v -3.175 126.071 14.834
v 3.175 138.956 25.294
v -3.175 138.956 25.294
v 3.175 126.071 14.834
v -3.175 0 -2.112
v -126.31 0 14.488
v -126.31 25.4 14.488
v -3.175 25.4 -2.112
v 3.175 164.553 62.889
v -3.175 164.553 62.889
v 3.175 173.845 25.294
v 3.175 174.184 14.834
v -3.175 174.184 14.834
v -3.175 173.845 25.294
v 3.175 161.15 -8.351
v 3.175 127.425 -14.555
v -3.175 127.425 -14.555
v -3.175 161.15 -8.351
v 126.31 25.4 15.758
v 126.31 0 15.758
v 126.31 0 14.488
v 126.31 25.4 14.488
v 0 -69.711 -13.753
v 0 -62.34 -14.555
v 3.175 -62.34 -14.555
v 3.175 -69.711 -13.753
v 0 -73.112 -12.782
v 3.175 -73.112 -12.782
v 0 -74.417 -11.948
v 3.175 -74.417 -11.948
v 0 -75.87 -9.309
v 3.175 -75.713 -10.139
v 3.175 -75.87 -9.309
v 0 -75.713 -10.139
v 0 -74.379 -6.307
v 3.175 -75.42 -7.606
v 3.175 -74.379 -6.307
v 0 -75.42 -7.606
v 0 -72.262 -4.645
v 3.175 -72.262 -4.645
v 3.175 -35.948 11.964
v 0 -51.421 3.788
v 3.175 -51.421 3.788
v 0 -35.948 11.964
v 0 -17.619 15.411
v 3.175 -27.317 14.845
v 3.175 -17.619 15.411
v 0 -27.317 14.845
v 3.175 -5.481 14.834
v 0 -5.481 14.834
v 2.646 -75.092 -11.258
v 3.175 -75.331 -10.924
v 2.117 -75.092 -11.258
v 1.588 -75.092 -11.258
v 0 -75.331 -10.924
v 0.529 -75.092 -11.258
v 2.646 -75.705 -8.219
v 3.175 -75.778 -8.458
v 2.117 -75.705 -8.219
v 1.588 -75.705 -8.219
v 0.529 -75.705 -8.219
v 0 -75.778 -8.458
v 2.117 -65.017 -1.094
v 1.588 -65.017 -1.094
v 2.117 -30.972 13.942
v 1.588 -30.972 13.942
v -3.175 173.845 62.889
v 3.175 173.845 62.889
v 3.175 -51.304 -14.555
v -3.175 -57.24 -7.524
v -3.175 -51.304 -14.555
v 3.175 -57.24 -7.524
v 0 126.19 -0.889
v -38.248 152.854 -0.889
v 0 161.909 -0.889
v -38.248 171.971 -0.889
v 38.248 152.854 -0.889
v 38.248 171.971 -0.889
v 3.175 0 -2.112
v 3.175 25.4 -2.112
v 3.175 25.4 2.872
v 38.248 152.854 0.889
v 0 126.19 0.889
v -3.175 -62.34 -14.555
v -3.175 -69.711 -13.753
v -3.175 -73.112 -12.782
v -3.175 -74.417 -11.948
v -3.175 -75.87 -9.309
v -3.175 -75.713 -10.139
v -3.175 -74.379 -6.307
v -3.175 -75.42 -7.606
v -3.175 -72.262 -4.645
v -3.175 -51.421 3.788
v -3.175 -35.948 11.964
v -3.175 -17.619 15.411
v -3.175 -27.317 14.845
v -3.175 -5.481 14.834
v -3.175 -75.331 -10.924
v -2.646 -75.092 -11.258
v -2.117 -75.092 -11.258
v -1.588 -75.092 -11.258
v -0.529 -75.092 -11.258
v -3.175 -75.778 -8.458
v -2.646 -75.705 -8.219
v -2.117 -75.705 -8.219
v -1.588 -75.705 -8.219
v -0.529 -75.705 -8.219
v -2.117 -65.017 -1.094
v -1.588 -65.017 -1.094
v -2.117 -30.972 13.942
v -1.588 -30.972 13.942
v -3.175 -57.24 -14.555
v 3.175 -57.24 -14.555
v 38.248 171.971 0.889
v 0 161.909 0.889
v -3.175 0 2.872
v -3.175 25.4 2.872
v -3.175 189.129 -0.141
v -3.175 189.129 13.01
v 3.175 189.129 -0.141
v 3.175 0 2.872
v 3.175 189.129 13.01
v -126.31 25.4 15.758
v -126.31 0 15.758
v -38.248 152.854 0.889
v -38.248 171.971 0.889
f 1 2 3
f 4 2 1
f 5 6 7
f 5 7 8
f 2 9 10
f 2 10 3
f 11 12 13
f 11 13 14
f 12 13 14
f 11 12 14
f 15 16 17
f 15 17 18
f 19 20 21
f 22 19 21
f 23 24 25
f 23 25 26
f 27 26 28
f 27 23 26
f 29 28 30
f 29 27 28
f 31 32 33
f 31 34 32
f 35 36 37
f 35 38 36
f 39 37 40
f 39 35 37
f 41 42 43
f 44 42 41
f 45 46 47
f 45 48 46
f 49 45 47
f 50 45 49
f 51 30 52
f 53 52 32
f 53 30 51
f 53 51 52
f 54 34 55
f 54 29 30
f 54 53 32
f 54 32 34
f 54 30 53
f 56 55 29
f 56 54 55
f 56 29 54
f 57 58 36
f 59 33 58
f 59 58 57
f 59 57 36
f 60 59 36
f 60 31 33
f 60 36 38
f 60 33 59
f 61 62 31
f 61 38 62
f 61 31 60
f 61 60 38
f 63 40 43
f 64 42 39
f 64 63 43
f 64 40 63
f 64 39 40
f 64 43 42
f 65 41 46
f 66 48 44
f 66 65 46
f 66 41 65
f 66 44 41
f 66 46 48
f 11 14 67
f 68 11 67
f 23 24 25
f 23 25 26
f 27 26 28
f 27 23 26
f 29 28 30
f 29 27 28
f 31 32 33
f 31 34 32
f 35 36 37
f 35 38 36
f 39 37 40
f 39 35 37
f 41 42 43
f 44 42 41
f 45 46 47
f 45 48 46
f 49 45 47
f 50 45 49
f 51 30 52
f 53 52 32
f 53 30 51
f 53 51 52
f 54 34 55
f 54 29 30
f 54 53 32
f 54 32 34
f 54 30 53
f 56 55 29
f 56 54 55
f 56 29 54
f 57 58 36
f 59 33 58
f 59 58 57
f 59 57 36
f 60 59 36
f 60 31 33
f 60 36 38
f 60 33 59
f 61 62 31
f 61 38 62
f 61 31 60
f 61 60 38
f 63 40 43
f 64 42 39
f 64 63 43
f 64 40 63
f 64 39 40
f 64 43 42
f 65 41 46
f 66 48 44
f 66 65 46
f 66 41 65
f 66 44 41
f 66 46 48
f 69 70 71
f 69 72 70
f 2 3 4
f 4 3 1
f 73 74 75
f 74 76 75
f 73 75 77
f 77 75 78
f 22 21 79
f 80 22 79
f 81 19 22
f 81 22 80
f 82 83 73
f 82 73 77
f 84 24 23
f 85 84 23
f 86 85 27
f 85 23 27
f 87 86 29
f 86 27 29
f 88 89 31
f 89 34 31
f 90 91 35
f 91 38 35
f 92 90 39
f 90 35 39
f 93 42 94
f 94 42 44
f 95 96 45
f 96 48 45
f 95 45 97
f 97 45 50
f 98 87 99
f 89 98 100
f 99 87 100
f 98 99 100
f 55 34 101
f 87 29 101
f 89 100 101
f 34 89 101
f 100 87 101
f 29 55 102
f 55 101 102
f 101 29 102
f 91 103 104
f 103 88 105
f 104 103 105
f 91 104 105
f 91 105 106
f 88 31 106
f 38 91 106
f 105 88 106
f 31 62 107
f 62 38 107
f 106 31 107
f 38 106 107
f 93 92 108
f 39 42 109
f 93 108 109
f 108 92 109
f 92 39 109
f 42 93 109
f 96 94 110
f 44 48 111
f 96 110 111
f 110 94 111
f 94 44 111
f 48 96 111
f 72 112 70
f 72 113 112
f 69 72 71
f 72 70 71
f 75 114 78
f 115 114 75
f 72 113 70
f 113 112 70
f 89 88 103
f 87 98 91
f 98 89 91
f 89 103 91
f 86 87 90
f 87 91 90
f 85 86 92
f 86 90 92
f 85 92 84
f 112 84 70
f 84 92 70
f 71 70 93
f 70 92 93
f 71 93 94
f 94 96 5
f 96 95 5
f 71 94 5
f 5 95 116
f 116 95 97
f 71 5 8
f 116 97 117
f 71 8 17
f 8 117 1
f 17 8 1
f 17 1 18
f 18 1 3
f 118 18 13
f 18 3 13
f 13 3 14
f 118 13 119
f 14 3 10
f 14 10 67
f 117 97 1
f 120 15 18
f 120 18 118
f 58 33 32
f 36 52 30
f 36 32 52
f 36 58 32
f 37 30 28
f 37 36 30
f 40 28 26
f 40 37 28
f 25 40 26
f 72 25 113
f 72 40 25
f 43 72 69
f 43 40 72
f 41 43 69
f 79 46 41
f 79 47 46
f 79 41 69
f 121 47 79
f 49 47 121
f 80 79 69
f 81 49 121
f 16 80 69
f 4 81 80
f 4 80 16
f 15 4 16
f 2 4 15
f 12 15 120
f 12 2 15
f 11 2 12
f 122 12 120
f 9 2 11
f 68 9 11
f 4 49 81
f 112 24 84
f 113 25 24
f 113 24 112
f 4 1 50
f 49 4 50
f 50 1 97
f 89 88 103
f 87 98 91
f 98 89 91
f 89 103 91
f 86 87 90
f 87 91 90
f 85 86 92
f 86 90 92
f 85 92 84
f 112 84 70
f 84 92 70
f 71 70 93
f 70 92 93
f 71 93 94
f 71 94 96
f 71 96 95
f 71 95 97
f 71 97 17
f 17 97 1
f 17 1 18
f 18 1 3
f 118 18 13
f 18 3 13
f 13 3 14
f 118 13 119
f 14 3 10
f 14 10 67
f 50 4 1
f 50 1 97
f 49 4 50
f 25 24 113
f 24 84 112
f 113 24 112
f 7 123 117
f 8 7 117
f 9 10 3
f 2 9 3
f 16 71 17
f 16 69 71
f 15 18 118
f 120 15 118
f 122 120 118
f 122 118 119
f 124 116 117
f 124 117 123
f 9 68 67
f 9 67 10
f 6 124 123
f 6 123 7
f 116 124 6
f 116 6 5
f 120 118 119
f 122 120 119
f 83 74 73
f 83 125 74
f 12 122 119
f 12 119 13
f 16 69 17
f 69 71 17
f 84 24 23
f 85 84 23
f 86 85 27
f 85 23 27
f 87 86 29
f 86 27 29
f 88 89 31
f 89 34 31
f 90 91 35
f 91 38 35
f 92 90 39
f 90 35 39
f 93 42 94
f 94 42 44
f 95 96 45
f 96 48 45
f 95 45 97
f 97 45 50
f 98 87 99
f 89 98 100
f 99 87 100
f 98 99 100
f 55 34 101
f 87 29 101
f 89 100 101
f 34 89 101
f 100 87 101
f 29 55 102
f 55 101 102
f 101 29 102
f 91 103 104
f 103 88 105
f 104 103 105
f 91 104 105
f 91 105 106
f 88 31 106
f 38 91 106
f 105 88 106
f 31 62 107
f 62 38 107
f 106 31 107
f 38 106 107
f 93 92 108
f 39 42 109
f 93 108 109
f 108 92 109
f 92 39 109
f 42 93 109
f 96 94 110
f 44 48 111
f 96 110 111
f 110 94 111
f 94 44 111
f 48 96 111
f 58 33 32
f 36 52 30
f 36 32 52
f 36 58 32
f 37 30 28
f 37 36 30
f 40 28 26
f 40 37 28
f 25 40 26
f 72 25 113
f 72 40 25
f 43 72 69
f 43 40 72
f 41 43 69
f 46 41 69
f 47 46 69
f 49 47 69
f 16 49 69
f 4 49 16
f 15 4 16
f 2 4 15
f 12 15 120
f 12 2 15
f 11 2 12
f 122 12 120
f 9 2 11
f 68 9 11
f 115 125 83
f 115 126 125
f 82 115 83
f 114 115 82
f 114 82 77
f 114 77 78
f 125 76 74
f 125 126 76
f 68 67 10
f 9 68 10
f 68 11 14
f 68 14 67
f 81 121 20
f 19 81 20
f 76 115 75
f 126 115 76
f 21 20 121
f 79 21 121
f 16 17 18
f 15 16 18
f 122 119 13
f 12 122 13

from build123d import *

# Parameters (mm, degrees)
F2_DEPTH = 0.889
F3_DEPTH = 3.175
F5_DEPTH = 25.4


with BuildPart() as f2:
    # F1 (on Top) → F2 (new body, symmetric)
    with BuildSketch(Plane.XY):
        Polygon((-38.2477380335, 152.8535187244), (0, 126.189917326), (38.2477380335, 152.8535187244), (38.2477380335, 171.9708293676), (0, 161.9090884924), (-38.2477380335, 171.9708293676), align=None)
    extrude(amount=F2_DEPTH, both=True)


with BuildPart() as f3:
    # F0 (on Right) → F3 (new body, symmetric)
    with BuildSketch(Plane.YZ):
        with BuildLine():
            Line((-51.3041354716, -14.5549571389), (78.9766012458, -14.5549571389))
            Line((78.9766012458, -14.5549571389), (127.4245007662, -14.5549571389))
            Line((127.4245007662, -14.5549571389), (161.1497849226, -8.35061213))
            Line((161.1497849226, -8.35061213), (189.1288757324, -0.1413154632))
            Line((189.1288757324, -0.1413154632), (189.1288757324, 13.0097735673))
            Line((189.1288757324, 13.0097735673), (174.1836199154, 14.8343300374))
            Line((174.1836199154, 14.8343300374), (173.8448575089, 25.2935626863))
            Line((173.8448575089, 25.2935626863), (173.8448575089, 62.8894009946))
            Line((173.8448575089, 62.8894009946), (164.5530762505, 62.8894009946))
            Line((164.5530762505, 62.8894009946), (138.9559194396, 25.2935626863))
            Line((138.9559194396, 25.2935626863), (126.0708575701, 14.8343300374))
            Line((126.0708575701, 14.8343300374), (76.2989670038, 14.8343300374))
            Line((76.2989670038, 14.8343300374), (-5.4806010848, 14.8343300374))
            add(Edge.make_bspline(
                [(-62.3397679301, -14.5549571389), (-65.7666039501, -14.0289106666), (-73.6639599321, -14.2560279061), (-77.9986398959, -7.1506636672), (-63.9936508601, -0.0084478731), (-50.8689666047, 2.7138254599), (-30.1701448446, 17.1092950293), (-16.709095113, 15.3311499793), (-5.4806010848, 14.8343300374)],
                knots=[0, 0, 0, 0, 0.1463983586, 0.2448918915, 0.4020221466, 0.5709034149, 0.7785778924, 1, 1, 1, 1], degree=3))
            Line((-62.3397679301, -14.5549571389), (-57.240087539, -14.5549571389))
            Line((-57.240087539, -14.5549571389), (-57.240087539, -7.5237769634))
            Line((-57.240087539, -7.5237769634), (-51.3041354716, -14.5549571389))
        make_face()
    extrude(amount=F3_DEPTH, both=True)

    # F4 (on Front) → F5 (join)
    with BuildSketch(Plane.XZ):
        Polygon((0, 2.54), (-126.3102396993, 15.7582959231), (-126.3102396993, 14.4882959231), (0, -2.54), align=None)
    extrude(amount=-F5_DEPTH)


with BuildPart() as f6_1:
    # F6: instance of F3
    add(f3.part.mirror(Plane.YZ))


solid = Compound([f2.part, f3.part, f6_1.part])
